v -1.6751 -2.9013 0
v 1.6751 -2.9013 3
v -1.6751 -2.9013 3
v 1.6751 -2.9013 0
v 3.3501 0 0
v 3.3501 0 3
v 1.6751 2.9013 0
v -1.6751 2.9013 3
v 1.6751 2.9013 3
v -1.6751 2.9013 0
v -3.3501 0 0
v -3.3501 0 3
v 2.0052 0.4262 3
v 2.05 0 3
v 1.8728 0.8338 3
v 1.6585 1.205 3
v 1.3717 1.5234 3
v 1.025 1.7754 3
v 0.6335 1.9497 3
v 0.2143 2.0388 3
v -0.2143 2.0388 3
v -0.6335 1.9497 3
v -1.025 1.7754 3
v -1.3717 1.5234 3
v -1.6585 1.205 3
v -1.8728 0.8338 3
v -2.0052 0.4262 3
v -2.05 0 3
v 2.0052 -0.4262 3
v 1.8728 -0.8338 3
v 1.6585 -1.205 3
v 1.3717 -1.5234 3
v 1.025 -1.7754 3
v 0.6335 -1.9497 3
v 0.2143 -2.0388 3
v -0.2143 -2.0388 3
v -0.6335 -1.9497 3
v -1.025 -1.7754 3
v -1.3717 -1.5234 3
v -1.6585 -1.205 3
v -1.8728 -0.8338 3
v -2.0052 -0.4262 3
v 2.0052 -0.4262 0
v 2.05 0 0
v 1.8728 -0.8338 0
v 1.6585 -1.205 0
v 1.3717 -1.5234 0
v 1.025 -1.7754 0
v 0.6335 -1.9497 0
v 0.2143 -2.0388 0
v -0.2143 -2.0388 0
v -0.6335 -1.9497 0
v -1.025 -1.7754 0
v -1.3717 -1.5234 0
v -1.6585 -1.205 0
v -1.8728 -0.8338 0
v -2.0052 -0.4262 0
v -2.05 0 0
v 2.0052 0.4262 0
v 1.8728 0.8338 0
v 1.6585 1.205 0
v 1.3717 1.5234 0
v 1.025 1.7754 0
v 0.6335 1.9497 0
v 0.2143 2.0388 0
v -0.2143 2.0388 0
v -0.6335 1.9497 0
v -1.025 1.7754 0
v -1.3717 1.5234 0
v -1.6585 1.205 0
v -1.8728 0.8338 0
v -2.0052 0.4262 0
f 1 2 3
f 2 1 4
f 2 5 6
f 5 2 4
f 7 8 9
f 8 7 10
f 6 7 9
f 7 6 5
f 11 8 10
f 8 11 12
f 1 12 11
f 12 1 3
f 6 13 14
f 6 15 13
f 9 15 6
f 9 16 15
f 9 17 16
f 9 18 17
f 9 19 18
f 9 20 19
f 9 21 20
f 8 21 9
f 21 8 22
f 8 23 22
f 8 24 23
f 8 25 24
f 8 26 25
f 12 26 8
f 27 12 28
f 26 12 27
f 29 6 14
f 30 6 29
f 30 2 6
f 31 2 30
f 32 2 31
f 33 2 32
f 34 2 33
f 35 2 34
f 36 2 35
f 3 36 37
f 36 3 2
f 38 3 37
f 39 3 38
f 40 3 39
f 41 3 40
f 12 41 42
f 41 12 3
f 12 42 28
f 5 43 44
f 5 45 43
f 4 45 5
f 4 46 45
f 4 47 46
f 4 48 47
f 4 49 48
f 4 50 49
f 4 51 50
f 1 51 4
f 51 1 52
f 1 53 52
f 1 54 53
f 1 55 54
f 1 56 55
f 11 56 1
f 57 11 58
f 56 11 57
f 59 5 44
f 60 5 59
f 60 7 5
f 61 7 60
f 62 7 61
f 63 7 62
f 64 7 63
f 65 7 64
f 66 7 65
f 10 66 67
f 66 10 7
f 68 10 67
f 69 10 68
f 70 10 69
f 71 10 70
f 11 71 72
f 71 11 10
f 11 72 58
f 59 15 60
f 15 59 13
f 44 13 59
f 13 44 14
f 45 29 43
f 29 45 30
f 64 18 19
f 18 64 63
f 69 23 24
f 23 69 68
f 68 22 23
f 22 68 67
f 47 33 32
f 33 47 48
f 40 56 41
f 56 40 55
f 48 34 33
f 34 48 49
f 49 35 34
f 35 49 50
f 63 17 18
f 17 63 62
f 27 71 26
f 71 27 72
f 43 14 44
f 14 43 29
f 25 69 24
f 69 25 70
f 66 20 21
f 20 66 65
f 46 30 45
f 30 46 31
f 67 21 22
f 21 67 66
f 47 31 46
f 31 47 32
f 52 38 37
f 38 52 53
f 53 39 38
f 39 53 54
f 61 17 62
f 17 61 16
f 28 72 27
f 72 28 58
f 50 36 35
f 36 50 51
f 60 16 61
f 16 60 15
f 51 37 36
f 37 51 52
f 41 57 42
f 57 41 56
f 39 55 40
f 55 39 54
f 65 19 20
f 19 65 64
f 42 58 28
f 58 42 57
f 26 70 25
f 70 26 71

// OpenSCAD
pi = 3.14159;

module m4_nut(){
  d = 6.7 / cos(pi/6);
  difference(){
    cylinder(d=d, h=3, $fn=6);
    translate([0,0,-1])cylinder(d=4.1, h=5, $fn=30);
  }
}
m4_nut();
